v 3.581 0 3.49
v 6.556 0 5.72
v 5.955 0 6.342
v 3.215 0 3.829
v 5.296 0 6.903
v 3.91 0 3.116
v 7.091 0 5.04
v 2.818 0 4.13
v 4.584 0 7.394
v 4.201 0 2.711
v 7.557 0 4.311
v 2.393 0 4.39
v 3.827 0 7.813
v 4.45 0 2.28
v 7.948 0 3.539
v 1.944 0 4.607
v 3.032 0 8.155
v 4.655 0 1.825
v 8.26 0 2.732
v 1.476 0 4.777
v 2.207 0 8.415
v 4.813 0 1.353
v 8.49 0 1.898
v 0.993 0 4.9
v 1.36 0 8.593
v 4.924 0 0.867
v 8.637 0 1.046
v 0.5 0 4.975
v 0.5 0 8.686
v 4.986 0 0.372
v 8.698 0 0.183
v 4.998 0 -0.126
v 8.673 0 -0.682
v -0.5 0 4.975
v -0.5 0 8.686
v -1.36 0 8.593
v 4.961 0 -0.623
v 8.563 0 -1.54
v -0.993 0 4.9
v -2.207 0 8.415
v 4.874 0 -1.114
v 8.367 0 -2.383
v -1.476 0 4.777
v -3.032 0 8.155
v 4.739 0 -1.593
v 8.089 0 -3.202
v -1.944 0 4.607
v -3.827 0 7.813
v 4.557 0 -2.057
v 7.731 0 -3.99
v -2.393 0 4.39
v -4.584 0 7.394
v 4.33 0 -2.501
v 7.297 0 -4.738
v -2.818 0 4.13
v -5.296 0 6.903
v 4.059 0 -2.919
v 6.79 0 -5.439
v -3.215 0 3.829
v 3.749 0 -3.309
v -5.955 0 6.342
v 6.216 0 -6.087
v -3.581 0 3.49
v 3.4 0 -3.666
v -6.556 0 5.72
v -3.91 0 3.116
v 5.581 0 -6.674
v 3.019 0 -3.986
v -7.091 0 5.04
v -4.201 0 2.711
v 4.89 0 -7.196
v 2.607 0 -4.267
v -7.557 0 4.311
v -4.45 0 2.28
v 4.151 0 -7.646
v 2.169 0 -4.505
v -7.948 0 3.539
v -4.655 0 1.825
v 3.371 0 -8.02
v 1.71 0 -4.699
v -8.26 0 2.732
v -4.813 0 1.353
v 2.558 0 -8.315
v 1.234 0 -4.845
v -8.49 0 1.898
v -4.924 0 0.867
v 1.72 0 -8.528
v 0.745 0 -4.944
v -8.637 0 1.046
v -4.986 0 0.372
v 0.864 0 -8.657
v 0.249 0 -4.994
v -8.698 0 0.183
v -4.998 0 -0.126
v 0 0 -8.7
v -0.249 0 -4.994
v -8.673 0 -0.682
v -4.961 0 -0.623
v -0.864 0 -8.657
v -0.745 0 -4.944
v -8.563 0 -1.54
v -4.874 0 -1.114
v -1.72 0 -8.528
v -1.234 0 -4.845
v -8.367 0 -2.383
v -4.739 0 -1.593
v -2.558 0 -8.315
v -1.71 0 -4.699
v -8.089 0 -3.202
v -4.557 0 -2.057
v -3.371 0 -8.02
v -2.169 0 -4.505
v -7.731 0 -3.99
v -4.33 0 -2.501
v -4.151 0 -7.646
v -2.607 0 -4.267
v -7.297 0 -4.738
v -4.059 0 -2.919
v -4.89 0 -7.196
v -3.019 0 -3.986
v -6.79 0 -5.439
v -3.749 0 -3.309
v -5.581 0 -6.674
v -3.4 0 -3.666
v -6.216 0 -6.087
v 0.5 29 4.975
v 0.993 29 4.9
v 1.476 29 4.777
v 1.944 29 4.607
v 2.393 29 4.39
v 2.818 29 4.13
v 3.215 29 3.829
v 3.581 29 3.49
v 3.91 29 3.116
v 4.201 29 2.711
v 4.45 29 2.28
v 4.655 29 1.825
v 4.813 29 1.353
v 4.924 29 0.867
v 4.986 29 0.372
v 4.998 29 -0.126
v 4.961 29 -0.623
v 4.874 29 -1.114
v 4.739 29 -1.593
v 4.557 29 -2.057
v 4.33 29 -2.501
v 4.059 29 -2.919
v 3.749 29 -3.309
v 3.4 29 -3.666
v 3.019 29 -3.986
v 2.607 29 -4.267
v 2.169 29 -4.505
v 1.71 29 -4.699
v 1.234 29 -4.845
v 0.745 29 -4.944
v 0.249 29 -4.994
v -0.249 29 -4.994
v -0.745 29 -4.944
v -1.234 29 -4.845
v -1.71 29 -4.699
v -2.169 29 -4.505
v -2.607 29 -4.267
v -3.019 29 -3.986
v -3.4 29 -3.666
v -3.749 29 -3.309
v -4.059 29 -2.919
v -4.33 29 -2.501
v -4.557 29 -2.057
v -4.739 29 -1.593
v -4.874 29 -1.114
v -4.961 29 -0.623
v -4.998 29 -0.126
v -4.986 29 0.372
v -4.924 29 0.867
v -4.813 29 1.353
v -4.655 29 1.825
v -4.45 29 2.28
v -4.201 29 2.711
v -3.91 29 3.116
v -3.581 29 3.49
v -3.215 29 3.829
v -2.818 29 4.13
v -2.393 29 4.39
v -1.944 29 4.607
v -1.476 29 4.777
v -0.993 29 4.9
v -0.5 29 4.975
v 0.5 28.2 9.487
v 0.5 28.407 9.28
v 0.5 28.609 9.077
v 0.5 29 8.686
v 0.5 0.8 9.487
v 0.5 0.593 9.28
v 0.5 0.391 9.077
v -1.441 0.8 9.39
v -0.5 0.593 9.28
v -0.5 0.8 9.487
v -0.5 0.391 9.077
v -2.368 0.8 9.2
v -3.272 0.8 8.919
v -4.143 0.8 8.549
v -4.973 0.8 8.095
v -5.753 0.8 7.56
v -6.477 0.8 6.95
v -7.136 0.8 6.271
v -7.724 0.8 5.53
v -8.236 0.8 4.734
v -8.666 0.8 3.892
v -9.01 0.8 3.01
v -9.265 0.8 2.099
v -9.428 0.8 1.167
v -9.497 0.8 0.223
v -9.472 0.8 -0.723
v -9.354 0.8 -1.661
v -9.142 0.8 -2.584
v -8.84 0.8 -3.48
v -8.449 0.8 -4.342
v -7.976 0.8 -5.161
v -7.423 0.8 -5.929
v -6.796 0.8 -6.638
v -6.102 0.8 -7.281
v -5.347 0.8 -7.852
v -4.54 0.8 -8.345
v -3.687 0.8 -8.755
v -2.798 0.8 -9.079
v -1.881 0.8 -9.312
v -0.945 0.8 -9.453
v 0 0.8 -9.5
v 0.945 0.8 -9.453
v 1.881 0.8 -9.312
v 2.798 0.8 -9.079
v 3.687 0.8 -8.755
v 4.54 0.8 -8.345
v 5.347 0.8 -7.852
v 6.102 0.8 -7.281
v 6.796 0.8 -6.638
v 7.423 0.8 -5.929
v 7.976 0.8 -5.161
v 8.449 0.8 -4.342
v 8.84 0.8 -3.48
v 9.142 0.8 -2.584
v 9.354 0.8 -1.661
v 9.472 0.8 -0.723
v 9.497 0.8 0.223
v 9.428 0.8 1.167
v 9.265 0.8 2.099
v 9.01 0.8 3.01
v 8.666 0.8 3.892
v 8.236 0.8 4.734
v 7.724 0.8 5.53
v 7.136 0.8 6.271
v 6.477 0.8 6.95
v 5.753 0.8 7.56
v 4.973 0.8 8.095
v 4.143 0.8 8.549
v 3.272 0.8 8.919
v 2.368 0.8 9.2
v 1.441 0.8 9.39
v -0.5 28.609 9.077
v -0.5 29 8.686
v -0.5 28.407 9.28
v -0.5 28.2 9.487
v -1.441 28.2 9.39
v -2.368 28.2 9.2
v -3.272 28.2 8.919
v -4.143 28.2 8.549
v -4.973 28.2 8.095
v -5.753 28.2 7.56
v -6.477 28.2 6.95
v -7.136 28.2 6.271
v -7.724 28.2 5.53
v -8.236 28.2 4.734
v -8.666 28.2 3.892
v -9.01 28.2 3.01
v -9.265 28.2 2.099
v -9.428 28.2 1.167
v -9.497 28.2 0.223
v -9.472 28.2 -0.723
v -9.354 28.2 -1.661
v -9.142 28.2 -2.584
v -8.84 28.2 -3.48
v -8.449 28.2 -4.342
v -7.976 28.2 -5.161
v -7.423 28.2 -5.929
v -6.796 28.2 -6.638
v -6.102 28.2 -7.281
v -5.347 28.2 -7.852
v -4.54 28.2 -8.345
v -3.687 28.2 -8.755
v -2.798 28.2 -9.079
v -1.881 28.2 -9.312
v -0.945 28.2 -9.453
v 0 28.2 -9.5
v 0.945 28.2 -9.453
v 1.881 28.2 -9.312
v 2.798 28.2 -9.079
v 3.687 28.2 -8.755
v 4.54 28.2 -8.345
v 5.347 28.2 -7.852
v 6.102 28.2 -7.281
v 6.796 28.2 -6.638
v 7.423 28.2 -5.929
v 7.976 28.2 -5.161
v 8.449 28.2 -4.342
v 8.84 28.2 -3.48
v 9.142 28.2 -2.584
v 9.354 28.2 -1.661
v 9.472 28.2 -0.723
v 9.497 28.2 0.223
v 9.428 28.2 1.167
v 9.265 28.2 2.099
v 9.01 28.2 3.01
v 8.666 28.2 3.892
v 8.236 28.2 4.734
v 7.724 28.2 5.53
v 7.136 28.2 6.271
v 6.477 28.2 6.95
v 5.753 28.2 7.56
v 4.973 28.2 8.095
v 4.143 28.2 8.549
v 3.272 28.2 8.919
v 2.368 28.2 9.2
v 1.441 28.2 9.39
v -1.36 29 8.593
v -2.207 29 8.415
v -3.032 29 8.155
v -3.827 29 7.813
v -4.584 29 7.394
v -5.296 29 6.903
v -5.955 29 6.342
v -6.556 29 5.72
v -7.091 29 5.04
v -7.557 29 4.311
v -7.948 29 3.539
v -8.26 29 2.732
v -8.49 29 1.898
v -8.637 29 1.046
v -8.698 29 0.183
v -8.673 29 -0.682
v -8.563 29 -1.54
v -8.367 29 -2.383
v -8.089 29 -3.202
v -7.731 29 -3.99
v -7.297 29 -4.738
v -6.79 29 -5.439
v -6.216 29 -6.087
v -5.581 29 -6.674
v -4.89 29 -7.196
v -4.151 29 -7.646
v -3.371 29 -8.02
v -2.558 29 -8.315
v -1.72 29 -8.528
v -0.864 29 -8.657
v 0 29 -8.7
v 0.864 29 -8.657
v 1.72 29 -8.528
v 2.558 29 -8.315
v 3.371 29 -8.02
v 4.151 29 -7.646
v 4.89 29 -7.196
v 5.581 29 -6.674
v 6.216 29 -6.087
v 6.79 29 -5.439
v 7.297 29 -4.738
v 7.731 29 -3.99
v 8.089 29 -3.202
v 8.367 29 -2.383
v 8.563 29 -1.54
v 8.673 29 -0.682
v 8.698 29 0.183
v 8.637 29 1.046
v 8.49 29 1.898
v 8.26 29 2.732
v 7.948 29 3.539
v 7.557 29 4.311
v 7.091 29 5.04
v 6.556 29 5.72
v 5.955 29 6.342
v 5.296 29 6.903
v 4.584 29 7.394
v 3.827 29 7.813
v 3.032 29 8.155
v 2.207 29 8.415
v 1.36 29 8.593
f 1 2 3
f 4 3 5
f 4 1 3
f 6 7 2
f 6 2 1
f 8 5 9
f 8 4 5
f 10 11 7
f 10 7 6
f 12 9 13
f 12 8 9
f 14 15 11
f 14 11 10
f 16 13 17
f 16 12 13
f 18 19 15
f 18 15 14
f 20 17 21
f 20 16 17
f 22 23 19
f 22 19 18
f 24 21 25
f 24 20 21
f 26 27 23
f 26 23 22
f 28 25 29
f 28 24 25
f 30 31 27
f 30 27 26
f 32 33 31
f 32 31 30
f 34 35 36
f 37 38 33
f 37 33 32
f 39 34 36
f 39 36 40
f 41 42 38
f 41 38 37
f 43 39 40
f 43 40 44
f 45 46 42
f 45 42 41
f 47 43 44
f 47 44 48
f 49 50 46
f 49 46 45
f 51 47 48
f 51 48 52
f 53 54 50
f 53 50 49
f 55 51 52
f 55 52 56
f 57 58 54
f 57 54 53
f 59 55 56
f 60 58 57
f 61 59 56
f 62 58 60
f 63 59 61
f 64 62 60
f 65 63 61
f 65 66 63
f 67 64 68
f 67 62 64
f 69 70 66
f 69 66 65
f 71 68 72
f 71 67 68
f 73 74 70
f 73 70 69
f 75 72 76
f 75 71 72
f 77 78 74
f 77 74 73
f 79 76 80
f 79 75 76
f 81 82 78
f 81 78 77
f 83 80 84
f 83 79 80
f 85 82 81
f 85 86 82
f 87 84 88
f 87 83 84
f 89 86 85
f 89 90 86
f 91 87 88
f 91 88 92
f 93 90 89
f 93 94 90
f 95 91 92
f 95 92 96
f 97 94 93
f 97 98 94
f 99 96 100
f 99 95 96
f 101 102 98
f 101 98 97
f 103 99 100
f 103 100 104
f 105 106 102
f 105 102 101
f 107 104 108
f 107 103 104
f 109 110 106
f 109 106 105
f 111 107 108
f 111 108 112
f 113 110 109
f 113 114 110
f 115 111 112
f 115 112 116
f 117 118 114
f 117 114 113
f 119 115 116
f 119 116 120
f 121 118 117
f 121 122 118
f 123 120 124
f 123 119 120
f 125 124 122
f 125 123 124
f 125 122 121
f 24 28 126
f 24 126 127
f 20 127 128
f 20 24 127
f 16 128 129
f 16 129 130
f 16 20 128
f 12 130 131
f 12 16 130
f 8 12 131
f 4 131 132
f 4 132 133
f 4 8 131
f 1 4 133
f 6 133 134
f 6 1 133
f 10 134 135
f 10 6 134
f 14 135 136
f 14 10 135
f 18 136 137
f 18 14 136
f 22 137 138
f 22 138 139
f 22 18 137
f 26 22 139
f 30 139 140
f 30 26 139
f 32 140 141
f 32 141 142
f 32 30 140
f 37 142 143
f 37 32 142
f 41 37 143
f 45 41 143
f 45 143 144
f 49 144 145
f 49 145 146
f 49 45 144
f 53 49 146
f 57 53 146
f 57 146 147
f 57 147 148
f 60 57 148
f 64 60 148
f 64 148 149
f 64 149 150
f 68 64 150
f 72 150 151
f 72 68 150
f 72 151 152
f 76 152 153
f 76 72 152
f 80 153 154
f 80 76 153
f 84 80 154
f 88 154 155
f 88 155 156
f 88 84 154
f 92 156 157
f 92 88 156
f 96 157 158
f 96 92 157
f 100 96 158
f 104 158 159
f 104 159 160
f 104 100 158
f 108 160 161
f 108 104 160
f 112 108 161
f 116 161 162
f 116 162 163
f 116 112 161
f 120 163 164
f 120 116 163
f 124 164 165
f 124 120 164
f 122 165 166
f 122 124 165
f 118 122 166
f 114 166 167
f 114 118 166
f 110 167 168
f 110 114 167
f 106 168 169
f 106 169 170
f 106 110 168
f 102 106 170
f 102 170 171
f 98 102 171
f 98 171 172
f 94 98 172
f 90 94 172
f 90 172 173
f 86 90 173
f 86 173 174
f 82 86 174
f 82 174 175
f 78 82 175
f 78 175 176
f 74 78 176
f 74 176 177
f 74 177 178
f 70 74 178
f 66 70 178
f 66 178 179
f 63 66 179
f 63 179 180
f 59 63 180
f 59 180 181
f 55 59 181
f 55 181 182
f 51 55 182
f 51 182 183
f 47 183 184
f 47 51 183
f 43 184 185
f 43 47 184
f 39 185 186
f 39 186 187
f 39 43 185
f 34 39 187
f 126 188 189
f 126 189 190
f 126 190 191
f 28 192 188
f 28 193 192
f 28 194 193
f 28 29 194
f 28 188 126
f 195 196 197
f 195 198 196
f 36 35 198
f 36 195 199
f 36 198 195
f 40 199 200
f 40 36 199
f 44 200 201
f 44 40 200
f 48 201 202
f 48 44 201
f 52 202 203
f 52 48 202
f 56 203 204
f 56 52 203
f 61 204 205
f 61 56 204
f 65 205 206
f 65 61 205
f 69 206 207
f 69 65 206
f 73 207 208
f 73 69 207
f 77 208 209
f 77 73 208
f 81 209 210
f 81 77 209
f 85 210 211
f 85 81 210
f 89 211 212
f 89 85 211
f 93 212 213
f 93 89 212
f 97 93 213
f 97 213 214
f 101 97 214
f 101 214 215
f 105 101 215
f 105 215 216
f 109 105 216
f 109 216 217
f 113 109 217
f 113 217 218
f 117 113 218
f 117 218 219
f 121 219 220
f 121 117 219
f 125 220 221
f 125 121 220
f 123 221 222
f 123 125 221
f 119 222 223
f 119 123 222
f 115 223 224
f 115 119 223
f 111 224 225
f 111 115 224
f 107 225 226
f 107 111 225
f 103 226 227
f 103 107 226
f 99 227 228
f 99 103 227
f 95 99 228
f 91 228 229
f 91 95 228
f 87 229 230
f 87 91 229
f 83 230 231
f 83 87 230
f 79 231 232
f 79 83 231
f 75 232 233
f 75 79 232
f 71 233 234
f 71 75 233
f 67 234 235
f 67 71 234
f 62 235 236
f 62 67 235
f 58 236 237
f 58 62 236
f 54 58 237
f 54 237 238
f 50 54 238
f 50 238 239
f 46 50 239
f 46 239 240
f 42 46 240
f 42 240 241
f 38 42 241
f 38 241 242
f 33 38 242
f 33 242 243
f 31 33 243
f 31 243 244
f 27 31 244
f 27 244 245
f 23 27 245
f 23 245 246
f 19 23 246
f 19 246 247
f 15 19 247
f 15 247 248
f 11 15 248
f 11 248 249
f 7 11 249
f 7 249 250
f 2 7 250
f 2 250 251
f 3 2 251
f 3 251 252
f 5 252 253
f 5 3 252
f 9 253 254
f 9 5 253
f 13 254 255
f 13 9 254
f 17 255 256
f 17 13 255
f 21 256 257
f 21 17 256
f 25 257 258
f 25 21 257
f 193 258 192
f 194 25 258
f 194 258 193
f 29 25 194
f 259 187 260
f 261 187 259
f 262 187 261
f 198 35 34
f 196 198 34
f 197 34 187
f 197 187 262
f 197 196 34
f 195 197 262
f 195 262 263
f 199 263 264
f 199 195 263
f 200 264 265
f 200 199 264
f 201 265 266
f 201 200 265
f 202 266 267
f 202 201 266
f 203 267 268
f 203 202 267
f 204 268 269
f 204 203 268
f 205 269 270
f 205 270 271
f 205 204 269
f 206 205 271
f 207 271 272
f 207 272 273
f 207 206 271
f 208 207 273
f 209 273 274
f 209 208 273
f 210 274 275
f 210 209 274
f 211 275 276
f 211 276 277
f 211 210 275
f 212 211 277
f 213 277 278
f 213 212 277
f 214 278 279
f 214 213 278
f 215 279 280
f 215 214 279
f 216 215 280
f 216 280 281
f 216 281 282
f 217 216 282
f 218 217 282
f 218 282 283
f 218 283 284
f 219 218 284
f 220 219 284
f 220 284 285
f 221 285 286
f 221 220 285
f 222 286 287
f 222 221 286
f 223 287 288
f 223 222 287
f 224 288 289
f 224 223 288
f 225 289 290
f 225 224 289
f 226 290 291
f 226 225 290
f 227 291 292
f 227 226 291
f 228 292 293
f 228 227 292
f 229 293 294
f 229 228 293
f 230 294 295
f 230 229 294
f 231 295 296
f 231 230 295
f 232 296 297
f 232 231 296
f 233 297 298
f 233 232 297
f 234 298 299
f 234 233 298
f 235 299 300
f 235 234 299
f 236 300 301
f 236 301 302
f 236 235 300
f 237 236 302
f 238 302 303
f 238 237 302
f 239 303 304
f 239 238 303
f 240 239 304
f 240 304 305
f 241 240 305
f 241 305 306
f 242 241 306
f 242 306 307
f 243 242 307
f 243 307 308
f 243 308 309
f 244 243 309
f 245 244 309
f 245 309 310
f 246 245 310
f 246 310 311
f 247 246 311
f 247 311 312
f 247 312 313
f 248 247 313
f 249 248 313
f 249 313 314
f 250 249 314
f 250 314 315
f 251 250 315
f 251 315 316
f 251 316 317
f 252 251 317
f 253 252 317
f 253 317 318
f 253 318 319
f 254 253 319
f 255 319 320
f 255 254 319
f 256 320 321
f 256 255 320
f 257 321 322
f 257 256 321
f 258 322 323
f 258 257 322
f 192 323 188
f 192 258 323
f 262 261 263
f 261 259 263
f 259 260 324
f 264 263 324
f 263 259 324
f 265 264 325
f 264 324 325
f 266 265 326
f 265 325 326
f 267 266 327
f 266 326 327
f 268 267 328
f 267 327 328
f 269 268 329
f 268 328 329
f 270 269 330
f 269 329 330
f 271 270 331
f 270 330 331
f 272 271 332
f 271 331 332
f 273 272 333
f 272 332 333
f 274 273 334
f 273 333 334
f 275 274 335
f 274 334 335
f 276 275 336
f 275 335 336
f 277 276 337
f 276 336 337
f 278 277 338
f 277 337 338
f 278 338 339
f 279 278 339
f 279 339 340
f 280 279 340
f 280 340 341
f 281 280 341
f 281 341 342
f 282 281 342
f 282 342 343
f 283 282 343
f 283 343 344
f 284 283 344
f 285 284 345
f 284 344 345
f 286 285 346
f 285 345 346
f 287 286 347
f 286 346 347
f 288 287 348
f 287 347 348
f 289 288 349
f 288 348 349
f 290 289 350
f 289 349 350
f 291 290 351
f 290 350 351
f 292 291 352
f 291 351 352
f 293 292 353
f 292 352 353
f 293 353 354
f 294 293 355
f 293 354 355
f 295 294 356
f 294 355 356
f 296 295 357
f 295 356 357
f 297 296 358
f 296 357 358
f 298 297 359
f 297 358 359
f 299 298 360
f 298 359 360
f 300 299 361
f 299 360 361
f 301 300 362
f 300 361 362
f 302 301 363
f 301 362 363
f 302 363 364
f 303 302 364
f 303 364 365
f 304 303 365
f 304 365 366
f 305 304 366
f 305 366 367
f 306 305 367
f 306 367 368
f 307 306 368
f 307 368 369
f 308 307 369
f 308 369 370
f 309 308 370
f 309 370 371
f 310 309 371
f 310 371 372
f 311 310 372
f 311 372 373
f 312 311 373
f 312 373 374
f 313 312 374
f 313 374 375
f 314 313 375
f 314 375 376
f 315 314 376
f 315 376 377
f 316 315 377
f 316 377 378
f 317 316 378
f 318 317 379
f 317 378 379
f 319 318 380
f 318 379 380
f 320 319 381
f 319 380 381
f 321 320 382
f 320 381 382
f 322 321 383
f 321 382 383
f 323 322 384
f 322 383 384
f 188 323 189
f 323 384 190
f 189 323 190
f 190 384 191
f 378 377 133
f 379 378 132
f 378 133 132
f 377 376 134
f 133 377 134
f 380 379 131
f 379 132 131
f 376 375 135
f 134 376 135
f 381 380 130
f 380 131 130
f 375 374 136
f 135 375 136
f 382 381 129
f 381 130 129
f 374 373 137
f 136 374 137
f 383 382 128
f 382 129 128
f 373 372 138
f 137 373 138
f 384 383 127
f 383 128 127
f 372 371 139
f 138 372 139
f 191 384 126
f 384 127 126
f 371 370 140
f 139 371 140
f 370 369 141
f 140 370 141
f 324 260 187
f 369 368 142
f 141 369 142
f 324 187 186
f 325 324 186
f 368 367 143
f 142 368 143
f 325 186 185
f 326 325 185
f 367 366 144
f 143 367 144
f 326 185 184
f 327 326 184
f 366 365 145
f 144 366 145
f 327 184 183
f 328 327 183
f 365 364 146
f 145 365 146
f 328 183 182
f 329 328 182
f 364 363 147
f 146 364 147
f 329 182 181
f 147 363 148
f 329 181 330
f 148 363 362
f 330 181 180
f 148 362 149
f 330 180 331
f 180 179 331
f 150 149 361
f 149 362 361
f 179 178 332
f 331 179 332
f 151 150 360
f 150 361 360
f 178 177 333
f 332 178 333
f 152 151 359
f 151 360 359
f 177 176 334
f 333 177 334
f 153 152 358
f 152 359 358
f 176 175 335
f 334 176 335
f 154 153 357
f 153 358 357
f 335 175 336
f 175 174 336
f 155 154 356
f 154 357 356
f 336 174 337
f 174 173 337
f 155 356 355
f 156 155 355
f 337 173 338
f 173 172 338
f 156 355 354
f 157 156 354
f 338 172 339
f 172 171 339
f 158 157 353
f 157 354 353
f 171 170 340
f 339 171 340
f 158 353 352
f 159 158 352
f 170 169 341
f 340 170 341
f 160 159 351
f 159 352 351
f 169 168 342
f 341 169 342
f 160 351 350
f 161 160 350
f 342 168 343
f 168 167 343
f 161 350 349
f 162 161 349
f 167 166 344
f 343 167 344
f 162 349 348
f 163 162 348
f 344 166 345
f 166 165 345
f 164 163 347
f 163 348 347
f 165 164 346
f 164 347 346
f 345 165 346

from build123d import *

# Parameters (mm, degrees)
BOSS_EXTRUDE1_DEPTH = 29
CHAMFER1_SIZE       = 0.8


with BuildPart() as part:
    # Sketch1 → Boss-Extrude1 (new body)
    with BuildSketch(Plane(origin=(0, 0, 0), x_dir=(1, 0, 0), z_dir=(0, 1, 0))):
        with BuildLine():
            Line((-0.5, -5), (-0.5, -9.486832981))
            ThreePointArc((-0.5, -9.486832981), (0, 9.5), (0.5, -9.486832981))
            Line((0.5, -9.486832981), (0.5, -5))
            Line((0.5, -5), (0.5, -4.974937186))
            ThreePointArc((0.5, -4.974937186), (0, 5), (-0.5, -4.974937186))
            Line((-0.5, -4.974937186), (-0.5, -5))
        make_face()
    extrude(amount=BOSS_EXTRUDE1_DEPTH)

    # Chamfer1
    chamfer1_edges = [part.edges().sort_by_distance(p)[0] for p in [
        (0, 29, -9.5),
        (0, 0, -9.5),
    ]]
    chamfer(chamfer1_edges, length=CHAMFER1_SIZE)


solid = part.part
